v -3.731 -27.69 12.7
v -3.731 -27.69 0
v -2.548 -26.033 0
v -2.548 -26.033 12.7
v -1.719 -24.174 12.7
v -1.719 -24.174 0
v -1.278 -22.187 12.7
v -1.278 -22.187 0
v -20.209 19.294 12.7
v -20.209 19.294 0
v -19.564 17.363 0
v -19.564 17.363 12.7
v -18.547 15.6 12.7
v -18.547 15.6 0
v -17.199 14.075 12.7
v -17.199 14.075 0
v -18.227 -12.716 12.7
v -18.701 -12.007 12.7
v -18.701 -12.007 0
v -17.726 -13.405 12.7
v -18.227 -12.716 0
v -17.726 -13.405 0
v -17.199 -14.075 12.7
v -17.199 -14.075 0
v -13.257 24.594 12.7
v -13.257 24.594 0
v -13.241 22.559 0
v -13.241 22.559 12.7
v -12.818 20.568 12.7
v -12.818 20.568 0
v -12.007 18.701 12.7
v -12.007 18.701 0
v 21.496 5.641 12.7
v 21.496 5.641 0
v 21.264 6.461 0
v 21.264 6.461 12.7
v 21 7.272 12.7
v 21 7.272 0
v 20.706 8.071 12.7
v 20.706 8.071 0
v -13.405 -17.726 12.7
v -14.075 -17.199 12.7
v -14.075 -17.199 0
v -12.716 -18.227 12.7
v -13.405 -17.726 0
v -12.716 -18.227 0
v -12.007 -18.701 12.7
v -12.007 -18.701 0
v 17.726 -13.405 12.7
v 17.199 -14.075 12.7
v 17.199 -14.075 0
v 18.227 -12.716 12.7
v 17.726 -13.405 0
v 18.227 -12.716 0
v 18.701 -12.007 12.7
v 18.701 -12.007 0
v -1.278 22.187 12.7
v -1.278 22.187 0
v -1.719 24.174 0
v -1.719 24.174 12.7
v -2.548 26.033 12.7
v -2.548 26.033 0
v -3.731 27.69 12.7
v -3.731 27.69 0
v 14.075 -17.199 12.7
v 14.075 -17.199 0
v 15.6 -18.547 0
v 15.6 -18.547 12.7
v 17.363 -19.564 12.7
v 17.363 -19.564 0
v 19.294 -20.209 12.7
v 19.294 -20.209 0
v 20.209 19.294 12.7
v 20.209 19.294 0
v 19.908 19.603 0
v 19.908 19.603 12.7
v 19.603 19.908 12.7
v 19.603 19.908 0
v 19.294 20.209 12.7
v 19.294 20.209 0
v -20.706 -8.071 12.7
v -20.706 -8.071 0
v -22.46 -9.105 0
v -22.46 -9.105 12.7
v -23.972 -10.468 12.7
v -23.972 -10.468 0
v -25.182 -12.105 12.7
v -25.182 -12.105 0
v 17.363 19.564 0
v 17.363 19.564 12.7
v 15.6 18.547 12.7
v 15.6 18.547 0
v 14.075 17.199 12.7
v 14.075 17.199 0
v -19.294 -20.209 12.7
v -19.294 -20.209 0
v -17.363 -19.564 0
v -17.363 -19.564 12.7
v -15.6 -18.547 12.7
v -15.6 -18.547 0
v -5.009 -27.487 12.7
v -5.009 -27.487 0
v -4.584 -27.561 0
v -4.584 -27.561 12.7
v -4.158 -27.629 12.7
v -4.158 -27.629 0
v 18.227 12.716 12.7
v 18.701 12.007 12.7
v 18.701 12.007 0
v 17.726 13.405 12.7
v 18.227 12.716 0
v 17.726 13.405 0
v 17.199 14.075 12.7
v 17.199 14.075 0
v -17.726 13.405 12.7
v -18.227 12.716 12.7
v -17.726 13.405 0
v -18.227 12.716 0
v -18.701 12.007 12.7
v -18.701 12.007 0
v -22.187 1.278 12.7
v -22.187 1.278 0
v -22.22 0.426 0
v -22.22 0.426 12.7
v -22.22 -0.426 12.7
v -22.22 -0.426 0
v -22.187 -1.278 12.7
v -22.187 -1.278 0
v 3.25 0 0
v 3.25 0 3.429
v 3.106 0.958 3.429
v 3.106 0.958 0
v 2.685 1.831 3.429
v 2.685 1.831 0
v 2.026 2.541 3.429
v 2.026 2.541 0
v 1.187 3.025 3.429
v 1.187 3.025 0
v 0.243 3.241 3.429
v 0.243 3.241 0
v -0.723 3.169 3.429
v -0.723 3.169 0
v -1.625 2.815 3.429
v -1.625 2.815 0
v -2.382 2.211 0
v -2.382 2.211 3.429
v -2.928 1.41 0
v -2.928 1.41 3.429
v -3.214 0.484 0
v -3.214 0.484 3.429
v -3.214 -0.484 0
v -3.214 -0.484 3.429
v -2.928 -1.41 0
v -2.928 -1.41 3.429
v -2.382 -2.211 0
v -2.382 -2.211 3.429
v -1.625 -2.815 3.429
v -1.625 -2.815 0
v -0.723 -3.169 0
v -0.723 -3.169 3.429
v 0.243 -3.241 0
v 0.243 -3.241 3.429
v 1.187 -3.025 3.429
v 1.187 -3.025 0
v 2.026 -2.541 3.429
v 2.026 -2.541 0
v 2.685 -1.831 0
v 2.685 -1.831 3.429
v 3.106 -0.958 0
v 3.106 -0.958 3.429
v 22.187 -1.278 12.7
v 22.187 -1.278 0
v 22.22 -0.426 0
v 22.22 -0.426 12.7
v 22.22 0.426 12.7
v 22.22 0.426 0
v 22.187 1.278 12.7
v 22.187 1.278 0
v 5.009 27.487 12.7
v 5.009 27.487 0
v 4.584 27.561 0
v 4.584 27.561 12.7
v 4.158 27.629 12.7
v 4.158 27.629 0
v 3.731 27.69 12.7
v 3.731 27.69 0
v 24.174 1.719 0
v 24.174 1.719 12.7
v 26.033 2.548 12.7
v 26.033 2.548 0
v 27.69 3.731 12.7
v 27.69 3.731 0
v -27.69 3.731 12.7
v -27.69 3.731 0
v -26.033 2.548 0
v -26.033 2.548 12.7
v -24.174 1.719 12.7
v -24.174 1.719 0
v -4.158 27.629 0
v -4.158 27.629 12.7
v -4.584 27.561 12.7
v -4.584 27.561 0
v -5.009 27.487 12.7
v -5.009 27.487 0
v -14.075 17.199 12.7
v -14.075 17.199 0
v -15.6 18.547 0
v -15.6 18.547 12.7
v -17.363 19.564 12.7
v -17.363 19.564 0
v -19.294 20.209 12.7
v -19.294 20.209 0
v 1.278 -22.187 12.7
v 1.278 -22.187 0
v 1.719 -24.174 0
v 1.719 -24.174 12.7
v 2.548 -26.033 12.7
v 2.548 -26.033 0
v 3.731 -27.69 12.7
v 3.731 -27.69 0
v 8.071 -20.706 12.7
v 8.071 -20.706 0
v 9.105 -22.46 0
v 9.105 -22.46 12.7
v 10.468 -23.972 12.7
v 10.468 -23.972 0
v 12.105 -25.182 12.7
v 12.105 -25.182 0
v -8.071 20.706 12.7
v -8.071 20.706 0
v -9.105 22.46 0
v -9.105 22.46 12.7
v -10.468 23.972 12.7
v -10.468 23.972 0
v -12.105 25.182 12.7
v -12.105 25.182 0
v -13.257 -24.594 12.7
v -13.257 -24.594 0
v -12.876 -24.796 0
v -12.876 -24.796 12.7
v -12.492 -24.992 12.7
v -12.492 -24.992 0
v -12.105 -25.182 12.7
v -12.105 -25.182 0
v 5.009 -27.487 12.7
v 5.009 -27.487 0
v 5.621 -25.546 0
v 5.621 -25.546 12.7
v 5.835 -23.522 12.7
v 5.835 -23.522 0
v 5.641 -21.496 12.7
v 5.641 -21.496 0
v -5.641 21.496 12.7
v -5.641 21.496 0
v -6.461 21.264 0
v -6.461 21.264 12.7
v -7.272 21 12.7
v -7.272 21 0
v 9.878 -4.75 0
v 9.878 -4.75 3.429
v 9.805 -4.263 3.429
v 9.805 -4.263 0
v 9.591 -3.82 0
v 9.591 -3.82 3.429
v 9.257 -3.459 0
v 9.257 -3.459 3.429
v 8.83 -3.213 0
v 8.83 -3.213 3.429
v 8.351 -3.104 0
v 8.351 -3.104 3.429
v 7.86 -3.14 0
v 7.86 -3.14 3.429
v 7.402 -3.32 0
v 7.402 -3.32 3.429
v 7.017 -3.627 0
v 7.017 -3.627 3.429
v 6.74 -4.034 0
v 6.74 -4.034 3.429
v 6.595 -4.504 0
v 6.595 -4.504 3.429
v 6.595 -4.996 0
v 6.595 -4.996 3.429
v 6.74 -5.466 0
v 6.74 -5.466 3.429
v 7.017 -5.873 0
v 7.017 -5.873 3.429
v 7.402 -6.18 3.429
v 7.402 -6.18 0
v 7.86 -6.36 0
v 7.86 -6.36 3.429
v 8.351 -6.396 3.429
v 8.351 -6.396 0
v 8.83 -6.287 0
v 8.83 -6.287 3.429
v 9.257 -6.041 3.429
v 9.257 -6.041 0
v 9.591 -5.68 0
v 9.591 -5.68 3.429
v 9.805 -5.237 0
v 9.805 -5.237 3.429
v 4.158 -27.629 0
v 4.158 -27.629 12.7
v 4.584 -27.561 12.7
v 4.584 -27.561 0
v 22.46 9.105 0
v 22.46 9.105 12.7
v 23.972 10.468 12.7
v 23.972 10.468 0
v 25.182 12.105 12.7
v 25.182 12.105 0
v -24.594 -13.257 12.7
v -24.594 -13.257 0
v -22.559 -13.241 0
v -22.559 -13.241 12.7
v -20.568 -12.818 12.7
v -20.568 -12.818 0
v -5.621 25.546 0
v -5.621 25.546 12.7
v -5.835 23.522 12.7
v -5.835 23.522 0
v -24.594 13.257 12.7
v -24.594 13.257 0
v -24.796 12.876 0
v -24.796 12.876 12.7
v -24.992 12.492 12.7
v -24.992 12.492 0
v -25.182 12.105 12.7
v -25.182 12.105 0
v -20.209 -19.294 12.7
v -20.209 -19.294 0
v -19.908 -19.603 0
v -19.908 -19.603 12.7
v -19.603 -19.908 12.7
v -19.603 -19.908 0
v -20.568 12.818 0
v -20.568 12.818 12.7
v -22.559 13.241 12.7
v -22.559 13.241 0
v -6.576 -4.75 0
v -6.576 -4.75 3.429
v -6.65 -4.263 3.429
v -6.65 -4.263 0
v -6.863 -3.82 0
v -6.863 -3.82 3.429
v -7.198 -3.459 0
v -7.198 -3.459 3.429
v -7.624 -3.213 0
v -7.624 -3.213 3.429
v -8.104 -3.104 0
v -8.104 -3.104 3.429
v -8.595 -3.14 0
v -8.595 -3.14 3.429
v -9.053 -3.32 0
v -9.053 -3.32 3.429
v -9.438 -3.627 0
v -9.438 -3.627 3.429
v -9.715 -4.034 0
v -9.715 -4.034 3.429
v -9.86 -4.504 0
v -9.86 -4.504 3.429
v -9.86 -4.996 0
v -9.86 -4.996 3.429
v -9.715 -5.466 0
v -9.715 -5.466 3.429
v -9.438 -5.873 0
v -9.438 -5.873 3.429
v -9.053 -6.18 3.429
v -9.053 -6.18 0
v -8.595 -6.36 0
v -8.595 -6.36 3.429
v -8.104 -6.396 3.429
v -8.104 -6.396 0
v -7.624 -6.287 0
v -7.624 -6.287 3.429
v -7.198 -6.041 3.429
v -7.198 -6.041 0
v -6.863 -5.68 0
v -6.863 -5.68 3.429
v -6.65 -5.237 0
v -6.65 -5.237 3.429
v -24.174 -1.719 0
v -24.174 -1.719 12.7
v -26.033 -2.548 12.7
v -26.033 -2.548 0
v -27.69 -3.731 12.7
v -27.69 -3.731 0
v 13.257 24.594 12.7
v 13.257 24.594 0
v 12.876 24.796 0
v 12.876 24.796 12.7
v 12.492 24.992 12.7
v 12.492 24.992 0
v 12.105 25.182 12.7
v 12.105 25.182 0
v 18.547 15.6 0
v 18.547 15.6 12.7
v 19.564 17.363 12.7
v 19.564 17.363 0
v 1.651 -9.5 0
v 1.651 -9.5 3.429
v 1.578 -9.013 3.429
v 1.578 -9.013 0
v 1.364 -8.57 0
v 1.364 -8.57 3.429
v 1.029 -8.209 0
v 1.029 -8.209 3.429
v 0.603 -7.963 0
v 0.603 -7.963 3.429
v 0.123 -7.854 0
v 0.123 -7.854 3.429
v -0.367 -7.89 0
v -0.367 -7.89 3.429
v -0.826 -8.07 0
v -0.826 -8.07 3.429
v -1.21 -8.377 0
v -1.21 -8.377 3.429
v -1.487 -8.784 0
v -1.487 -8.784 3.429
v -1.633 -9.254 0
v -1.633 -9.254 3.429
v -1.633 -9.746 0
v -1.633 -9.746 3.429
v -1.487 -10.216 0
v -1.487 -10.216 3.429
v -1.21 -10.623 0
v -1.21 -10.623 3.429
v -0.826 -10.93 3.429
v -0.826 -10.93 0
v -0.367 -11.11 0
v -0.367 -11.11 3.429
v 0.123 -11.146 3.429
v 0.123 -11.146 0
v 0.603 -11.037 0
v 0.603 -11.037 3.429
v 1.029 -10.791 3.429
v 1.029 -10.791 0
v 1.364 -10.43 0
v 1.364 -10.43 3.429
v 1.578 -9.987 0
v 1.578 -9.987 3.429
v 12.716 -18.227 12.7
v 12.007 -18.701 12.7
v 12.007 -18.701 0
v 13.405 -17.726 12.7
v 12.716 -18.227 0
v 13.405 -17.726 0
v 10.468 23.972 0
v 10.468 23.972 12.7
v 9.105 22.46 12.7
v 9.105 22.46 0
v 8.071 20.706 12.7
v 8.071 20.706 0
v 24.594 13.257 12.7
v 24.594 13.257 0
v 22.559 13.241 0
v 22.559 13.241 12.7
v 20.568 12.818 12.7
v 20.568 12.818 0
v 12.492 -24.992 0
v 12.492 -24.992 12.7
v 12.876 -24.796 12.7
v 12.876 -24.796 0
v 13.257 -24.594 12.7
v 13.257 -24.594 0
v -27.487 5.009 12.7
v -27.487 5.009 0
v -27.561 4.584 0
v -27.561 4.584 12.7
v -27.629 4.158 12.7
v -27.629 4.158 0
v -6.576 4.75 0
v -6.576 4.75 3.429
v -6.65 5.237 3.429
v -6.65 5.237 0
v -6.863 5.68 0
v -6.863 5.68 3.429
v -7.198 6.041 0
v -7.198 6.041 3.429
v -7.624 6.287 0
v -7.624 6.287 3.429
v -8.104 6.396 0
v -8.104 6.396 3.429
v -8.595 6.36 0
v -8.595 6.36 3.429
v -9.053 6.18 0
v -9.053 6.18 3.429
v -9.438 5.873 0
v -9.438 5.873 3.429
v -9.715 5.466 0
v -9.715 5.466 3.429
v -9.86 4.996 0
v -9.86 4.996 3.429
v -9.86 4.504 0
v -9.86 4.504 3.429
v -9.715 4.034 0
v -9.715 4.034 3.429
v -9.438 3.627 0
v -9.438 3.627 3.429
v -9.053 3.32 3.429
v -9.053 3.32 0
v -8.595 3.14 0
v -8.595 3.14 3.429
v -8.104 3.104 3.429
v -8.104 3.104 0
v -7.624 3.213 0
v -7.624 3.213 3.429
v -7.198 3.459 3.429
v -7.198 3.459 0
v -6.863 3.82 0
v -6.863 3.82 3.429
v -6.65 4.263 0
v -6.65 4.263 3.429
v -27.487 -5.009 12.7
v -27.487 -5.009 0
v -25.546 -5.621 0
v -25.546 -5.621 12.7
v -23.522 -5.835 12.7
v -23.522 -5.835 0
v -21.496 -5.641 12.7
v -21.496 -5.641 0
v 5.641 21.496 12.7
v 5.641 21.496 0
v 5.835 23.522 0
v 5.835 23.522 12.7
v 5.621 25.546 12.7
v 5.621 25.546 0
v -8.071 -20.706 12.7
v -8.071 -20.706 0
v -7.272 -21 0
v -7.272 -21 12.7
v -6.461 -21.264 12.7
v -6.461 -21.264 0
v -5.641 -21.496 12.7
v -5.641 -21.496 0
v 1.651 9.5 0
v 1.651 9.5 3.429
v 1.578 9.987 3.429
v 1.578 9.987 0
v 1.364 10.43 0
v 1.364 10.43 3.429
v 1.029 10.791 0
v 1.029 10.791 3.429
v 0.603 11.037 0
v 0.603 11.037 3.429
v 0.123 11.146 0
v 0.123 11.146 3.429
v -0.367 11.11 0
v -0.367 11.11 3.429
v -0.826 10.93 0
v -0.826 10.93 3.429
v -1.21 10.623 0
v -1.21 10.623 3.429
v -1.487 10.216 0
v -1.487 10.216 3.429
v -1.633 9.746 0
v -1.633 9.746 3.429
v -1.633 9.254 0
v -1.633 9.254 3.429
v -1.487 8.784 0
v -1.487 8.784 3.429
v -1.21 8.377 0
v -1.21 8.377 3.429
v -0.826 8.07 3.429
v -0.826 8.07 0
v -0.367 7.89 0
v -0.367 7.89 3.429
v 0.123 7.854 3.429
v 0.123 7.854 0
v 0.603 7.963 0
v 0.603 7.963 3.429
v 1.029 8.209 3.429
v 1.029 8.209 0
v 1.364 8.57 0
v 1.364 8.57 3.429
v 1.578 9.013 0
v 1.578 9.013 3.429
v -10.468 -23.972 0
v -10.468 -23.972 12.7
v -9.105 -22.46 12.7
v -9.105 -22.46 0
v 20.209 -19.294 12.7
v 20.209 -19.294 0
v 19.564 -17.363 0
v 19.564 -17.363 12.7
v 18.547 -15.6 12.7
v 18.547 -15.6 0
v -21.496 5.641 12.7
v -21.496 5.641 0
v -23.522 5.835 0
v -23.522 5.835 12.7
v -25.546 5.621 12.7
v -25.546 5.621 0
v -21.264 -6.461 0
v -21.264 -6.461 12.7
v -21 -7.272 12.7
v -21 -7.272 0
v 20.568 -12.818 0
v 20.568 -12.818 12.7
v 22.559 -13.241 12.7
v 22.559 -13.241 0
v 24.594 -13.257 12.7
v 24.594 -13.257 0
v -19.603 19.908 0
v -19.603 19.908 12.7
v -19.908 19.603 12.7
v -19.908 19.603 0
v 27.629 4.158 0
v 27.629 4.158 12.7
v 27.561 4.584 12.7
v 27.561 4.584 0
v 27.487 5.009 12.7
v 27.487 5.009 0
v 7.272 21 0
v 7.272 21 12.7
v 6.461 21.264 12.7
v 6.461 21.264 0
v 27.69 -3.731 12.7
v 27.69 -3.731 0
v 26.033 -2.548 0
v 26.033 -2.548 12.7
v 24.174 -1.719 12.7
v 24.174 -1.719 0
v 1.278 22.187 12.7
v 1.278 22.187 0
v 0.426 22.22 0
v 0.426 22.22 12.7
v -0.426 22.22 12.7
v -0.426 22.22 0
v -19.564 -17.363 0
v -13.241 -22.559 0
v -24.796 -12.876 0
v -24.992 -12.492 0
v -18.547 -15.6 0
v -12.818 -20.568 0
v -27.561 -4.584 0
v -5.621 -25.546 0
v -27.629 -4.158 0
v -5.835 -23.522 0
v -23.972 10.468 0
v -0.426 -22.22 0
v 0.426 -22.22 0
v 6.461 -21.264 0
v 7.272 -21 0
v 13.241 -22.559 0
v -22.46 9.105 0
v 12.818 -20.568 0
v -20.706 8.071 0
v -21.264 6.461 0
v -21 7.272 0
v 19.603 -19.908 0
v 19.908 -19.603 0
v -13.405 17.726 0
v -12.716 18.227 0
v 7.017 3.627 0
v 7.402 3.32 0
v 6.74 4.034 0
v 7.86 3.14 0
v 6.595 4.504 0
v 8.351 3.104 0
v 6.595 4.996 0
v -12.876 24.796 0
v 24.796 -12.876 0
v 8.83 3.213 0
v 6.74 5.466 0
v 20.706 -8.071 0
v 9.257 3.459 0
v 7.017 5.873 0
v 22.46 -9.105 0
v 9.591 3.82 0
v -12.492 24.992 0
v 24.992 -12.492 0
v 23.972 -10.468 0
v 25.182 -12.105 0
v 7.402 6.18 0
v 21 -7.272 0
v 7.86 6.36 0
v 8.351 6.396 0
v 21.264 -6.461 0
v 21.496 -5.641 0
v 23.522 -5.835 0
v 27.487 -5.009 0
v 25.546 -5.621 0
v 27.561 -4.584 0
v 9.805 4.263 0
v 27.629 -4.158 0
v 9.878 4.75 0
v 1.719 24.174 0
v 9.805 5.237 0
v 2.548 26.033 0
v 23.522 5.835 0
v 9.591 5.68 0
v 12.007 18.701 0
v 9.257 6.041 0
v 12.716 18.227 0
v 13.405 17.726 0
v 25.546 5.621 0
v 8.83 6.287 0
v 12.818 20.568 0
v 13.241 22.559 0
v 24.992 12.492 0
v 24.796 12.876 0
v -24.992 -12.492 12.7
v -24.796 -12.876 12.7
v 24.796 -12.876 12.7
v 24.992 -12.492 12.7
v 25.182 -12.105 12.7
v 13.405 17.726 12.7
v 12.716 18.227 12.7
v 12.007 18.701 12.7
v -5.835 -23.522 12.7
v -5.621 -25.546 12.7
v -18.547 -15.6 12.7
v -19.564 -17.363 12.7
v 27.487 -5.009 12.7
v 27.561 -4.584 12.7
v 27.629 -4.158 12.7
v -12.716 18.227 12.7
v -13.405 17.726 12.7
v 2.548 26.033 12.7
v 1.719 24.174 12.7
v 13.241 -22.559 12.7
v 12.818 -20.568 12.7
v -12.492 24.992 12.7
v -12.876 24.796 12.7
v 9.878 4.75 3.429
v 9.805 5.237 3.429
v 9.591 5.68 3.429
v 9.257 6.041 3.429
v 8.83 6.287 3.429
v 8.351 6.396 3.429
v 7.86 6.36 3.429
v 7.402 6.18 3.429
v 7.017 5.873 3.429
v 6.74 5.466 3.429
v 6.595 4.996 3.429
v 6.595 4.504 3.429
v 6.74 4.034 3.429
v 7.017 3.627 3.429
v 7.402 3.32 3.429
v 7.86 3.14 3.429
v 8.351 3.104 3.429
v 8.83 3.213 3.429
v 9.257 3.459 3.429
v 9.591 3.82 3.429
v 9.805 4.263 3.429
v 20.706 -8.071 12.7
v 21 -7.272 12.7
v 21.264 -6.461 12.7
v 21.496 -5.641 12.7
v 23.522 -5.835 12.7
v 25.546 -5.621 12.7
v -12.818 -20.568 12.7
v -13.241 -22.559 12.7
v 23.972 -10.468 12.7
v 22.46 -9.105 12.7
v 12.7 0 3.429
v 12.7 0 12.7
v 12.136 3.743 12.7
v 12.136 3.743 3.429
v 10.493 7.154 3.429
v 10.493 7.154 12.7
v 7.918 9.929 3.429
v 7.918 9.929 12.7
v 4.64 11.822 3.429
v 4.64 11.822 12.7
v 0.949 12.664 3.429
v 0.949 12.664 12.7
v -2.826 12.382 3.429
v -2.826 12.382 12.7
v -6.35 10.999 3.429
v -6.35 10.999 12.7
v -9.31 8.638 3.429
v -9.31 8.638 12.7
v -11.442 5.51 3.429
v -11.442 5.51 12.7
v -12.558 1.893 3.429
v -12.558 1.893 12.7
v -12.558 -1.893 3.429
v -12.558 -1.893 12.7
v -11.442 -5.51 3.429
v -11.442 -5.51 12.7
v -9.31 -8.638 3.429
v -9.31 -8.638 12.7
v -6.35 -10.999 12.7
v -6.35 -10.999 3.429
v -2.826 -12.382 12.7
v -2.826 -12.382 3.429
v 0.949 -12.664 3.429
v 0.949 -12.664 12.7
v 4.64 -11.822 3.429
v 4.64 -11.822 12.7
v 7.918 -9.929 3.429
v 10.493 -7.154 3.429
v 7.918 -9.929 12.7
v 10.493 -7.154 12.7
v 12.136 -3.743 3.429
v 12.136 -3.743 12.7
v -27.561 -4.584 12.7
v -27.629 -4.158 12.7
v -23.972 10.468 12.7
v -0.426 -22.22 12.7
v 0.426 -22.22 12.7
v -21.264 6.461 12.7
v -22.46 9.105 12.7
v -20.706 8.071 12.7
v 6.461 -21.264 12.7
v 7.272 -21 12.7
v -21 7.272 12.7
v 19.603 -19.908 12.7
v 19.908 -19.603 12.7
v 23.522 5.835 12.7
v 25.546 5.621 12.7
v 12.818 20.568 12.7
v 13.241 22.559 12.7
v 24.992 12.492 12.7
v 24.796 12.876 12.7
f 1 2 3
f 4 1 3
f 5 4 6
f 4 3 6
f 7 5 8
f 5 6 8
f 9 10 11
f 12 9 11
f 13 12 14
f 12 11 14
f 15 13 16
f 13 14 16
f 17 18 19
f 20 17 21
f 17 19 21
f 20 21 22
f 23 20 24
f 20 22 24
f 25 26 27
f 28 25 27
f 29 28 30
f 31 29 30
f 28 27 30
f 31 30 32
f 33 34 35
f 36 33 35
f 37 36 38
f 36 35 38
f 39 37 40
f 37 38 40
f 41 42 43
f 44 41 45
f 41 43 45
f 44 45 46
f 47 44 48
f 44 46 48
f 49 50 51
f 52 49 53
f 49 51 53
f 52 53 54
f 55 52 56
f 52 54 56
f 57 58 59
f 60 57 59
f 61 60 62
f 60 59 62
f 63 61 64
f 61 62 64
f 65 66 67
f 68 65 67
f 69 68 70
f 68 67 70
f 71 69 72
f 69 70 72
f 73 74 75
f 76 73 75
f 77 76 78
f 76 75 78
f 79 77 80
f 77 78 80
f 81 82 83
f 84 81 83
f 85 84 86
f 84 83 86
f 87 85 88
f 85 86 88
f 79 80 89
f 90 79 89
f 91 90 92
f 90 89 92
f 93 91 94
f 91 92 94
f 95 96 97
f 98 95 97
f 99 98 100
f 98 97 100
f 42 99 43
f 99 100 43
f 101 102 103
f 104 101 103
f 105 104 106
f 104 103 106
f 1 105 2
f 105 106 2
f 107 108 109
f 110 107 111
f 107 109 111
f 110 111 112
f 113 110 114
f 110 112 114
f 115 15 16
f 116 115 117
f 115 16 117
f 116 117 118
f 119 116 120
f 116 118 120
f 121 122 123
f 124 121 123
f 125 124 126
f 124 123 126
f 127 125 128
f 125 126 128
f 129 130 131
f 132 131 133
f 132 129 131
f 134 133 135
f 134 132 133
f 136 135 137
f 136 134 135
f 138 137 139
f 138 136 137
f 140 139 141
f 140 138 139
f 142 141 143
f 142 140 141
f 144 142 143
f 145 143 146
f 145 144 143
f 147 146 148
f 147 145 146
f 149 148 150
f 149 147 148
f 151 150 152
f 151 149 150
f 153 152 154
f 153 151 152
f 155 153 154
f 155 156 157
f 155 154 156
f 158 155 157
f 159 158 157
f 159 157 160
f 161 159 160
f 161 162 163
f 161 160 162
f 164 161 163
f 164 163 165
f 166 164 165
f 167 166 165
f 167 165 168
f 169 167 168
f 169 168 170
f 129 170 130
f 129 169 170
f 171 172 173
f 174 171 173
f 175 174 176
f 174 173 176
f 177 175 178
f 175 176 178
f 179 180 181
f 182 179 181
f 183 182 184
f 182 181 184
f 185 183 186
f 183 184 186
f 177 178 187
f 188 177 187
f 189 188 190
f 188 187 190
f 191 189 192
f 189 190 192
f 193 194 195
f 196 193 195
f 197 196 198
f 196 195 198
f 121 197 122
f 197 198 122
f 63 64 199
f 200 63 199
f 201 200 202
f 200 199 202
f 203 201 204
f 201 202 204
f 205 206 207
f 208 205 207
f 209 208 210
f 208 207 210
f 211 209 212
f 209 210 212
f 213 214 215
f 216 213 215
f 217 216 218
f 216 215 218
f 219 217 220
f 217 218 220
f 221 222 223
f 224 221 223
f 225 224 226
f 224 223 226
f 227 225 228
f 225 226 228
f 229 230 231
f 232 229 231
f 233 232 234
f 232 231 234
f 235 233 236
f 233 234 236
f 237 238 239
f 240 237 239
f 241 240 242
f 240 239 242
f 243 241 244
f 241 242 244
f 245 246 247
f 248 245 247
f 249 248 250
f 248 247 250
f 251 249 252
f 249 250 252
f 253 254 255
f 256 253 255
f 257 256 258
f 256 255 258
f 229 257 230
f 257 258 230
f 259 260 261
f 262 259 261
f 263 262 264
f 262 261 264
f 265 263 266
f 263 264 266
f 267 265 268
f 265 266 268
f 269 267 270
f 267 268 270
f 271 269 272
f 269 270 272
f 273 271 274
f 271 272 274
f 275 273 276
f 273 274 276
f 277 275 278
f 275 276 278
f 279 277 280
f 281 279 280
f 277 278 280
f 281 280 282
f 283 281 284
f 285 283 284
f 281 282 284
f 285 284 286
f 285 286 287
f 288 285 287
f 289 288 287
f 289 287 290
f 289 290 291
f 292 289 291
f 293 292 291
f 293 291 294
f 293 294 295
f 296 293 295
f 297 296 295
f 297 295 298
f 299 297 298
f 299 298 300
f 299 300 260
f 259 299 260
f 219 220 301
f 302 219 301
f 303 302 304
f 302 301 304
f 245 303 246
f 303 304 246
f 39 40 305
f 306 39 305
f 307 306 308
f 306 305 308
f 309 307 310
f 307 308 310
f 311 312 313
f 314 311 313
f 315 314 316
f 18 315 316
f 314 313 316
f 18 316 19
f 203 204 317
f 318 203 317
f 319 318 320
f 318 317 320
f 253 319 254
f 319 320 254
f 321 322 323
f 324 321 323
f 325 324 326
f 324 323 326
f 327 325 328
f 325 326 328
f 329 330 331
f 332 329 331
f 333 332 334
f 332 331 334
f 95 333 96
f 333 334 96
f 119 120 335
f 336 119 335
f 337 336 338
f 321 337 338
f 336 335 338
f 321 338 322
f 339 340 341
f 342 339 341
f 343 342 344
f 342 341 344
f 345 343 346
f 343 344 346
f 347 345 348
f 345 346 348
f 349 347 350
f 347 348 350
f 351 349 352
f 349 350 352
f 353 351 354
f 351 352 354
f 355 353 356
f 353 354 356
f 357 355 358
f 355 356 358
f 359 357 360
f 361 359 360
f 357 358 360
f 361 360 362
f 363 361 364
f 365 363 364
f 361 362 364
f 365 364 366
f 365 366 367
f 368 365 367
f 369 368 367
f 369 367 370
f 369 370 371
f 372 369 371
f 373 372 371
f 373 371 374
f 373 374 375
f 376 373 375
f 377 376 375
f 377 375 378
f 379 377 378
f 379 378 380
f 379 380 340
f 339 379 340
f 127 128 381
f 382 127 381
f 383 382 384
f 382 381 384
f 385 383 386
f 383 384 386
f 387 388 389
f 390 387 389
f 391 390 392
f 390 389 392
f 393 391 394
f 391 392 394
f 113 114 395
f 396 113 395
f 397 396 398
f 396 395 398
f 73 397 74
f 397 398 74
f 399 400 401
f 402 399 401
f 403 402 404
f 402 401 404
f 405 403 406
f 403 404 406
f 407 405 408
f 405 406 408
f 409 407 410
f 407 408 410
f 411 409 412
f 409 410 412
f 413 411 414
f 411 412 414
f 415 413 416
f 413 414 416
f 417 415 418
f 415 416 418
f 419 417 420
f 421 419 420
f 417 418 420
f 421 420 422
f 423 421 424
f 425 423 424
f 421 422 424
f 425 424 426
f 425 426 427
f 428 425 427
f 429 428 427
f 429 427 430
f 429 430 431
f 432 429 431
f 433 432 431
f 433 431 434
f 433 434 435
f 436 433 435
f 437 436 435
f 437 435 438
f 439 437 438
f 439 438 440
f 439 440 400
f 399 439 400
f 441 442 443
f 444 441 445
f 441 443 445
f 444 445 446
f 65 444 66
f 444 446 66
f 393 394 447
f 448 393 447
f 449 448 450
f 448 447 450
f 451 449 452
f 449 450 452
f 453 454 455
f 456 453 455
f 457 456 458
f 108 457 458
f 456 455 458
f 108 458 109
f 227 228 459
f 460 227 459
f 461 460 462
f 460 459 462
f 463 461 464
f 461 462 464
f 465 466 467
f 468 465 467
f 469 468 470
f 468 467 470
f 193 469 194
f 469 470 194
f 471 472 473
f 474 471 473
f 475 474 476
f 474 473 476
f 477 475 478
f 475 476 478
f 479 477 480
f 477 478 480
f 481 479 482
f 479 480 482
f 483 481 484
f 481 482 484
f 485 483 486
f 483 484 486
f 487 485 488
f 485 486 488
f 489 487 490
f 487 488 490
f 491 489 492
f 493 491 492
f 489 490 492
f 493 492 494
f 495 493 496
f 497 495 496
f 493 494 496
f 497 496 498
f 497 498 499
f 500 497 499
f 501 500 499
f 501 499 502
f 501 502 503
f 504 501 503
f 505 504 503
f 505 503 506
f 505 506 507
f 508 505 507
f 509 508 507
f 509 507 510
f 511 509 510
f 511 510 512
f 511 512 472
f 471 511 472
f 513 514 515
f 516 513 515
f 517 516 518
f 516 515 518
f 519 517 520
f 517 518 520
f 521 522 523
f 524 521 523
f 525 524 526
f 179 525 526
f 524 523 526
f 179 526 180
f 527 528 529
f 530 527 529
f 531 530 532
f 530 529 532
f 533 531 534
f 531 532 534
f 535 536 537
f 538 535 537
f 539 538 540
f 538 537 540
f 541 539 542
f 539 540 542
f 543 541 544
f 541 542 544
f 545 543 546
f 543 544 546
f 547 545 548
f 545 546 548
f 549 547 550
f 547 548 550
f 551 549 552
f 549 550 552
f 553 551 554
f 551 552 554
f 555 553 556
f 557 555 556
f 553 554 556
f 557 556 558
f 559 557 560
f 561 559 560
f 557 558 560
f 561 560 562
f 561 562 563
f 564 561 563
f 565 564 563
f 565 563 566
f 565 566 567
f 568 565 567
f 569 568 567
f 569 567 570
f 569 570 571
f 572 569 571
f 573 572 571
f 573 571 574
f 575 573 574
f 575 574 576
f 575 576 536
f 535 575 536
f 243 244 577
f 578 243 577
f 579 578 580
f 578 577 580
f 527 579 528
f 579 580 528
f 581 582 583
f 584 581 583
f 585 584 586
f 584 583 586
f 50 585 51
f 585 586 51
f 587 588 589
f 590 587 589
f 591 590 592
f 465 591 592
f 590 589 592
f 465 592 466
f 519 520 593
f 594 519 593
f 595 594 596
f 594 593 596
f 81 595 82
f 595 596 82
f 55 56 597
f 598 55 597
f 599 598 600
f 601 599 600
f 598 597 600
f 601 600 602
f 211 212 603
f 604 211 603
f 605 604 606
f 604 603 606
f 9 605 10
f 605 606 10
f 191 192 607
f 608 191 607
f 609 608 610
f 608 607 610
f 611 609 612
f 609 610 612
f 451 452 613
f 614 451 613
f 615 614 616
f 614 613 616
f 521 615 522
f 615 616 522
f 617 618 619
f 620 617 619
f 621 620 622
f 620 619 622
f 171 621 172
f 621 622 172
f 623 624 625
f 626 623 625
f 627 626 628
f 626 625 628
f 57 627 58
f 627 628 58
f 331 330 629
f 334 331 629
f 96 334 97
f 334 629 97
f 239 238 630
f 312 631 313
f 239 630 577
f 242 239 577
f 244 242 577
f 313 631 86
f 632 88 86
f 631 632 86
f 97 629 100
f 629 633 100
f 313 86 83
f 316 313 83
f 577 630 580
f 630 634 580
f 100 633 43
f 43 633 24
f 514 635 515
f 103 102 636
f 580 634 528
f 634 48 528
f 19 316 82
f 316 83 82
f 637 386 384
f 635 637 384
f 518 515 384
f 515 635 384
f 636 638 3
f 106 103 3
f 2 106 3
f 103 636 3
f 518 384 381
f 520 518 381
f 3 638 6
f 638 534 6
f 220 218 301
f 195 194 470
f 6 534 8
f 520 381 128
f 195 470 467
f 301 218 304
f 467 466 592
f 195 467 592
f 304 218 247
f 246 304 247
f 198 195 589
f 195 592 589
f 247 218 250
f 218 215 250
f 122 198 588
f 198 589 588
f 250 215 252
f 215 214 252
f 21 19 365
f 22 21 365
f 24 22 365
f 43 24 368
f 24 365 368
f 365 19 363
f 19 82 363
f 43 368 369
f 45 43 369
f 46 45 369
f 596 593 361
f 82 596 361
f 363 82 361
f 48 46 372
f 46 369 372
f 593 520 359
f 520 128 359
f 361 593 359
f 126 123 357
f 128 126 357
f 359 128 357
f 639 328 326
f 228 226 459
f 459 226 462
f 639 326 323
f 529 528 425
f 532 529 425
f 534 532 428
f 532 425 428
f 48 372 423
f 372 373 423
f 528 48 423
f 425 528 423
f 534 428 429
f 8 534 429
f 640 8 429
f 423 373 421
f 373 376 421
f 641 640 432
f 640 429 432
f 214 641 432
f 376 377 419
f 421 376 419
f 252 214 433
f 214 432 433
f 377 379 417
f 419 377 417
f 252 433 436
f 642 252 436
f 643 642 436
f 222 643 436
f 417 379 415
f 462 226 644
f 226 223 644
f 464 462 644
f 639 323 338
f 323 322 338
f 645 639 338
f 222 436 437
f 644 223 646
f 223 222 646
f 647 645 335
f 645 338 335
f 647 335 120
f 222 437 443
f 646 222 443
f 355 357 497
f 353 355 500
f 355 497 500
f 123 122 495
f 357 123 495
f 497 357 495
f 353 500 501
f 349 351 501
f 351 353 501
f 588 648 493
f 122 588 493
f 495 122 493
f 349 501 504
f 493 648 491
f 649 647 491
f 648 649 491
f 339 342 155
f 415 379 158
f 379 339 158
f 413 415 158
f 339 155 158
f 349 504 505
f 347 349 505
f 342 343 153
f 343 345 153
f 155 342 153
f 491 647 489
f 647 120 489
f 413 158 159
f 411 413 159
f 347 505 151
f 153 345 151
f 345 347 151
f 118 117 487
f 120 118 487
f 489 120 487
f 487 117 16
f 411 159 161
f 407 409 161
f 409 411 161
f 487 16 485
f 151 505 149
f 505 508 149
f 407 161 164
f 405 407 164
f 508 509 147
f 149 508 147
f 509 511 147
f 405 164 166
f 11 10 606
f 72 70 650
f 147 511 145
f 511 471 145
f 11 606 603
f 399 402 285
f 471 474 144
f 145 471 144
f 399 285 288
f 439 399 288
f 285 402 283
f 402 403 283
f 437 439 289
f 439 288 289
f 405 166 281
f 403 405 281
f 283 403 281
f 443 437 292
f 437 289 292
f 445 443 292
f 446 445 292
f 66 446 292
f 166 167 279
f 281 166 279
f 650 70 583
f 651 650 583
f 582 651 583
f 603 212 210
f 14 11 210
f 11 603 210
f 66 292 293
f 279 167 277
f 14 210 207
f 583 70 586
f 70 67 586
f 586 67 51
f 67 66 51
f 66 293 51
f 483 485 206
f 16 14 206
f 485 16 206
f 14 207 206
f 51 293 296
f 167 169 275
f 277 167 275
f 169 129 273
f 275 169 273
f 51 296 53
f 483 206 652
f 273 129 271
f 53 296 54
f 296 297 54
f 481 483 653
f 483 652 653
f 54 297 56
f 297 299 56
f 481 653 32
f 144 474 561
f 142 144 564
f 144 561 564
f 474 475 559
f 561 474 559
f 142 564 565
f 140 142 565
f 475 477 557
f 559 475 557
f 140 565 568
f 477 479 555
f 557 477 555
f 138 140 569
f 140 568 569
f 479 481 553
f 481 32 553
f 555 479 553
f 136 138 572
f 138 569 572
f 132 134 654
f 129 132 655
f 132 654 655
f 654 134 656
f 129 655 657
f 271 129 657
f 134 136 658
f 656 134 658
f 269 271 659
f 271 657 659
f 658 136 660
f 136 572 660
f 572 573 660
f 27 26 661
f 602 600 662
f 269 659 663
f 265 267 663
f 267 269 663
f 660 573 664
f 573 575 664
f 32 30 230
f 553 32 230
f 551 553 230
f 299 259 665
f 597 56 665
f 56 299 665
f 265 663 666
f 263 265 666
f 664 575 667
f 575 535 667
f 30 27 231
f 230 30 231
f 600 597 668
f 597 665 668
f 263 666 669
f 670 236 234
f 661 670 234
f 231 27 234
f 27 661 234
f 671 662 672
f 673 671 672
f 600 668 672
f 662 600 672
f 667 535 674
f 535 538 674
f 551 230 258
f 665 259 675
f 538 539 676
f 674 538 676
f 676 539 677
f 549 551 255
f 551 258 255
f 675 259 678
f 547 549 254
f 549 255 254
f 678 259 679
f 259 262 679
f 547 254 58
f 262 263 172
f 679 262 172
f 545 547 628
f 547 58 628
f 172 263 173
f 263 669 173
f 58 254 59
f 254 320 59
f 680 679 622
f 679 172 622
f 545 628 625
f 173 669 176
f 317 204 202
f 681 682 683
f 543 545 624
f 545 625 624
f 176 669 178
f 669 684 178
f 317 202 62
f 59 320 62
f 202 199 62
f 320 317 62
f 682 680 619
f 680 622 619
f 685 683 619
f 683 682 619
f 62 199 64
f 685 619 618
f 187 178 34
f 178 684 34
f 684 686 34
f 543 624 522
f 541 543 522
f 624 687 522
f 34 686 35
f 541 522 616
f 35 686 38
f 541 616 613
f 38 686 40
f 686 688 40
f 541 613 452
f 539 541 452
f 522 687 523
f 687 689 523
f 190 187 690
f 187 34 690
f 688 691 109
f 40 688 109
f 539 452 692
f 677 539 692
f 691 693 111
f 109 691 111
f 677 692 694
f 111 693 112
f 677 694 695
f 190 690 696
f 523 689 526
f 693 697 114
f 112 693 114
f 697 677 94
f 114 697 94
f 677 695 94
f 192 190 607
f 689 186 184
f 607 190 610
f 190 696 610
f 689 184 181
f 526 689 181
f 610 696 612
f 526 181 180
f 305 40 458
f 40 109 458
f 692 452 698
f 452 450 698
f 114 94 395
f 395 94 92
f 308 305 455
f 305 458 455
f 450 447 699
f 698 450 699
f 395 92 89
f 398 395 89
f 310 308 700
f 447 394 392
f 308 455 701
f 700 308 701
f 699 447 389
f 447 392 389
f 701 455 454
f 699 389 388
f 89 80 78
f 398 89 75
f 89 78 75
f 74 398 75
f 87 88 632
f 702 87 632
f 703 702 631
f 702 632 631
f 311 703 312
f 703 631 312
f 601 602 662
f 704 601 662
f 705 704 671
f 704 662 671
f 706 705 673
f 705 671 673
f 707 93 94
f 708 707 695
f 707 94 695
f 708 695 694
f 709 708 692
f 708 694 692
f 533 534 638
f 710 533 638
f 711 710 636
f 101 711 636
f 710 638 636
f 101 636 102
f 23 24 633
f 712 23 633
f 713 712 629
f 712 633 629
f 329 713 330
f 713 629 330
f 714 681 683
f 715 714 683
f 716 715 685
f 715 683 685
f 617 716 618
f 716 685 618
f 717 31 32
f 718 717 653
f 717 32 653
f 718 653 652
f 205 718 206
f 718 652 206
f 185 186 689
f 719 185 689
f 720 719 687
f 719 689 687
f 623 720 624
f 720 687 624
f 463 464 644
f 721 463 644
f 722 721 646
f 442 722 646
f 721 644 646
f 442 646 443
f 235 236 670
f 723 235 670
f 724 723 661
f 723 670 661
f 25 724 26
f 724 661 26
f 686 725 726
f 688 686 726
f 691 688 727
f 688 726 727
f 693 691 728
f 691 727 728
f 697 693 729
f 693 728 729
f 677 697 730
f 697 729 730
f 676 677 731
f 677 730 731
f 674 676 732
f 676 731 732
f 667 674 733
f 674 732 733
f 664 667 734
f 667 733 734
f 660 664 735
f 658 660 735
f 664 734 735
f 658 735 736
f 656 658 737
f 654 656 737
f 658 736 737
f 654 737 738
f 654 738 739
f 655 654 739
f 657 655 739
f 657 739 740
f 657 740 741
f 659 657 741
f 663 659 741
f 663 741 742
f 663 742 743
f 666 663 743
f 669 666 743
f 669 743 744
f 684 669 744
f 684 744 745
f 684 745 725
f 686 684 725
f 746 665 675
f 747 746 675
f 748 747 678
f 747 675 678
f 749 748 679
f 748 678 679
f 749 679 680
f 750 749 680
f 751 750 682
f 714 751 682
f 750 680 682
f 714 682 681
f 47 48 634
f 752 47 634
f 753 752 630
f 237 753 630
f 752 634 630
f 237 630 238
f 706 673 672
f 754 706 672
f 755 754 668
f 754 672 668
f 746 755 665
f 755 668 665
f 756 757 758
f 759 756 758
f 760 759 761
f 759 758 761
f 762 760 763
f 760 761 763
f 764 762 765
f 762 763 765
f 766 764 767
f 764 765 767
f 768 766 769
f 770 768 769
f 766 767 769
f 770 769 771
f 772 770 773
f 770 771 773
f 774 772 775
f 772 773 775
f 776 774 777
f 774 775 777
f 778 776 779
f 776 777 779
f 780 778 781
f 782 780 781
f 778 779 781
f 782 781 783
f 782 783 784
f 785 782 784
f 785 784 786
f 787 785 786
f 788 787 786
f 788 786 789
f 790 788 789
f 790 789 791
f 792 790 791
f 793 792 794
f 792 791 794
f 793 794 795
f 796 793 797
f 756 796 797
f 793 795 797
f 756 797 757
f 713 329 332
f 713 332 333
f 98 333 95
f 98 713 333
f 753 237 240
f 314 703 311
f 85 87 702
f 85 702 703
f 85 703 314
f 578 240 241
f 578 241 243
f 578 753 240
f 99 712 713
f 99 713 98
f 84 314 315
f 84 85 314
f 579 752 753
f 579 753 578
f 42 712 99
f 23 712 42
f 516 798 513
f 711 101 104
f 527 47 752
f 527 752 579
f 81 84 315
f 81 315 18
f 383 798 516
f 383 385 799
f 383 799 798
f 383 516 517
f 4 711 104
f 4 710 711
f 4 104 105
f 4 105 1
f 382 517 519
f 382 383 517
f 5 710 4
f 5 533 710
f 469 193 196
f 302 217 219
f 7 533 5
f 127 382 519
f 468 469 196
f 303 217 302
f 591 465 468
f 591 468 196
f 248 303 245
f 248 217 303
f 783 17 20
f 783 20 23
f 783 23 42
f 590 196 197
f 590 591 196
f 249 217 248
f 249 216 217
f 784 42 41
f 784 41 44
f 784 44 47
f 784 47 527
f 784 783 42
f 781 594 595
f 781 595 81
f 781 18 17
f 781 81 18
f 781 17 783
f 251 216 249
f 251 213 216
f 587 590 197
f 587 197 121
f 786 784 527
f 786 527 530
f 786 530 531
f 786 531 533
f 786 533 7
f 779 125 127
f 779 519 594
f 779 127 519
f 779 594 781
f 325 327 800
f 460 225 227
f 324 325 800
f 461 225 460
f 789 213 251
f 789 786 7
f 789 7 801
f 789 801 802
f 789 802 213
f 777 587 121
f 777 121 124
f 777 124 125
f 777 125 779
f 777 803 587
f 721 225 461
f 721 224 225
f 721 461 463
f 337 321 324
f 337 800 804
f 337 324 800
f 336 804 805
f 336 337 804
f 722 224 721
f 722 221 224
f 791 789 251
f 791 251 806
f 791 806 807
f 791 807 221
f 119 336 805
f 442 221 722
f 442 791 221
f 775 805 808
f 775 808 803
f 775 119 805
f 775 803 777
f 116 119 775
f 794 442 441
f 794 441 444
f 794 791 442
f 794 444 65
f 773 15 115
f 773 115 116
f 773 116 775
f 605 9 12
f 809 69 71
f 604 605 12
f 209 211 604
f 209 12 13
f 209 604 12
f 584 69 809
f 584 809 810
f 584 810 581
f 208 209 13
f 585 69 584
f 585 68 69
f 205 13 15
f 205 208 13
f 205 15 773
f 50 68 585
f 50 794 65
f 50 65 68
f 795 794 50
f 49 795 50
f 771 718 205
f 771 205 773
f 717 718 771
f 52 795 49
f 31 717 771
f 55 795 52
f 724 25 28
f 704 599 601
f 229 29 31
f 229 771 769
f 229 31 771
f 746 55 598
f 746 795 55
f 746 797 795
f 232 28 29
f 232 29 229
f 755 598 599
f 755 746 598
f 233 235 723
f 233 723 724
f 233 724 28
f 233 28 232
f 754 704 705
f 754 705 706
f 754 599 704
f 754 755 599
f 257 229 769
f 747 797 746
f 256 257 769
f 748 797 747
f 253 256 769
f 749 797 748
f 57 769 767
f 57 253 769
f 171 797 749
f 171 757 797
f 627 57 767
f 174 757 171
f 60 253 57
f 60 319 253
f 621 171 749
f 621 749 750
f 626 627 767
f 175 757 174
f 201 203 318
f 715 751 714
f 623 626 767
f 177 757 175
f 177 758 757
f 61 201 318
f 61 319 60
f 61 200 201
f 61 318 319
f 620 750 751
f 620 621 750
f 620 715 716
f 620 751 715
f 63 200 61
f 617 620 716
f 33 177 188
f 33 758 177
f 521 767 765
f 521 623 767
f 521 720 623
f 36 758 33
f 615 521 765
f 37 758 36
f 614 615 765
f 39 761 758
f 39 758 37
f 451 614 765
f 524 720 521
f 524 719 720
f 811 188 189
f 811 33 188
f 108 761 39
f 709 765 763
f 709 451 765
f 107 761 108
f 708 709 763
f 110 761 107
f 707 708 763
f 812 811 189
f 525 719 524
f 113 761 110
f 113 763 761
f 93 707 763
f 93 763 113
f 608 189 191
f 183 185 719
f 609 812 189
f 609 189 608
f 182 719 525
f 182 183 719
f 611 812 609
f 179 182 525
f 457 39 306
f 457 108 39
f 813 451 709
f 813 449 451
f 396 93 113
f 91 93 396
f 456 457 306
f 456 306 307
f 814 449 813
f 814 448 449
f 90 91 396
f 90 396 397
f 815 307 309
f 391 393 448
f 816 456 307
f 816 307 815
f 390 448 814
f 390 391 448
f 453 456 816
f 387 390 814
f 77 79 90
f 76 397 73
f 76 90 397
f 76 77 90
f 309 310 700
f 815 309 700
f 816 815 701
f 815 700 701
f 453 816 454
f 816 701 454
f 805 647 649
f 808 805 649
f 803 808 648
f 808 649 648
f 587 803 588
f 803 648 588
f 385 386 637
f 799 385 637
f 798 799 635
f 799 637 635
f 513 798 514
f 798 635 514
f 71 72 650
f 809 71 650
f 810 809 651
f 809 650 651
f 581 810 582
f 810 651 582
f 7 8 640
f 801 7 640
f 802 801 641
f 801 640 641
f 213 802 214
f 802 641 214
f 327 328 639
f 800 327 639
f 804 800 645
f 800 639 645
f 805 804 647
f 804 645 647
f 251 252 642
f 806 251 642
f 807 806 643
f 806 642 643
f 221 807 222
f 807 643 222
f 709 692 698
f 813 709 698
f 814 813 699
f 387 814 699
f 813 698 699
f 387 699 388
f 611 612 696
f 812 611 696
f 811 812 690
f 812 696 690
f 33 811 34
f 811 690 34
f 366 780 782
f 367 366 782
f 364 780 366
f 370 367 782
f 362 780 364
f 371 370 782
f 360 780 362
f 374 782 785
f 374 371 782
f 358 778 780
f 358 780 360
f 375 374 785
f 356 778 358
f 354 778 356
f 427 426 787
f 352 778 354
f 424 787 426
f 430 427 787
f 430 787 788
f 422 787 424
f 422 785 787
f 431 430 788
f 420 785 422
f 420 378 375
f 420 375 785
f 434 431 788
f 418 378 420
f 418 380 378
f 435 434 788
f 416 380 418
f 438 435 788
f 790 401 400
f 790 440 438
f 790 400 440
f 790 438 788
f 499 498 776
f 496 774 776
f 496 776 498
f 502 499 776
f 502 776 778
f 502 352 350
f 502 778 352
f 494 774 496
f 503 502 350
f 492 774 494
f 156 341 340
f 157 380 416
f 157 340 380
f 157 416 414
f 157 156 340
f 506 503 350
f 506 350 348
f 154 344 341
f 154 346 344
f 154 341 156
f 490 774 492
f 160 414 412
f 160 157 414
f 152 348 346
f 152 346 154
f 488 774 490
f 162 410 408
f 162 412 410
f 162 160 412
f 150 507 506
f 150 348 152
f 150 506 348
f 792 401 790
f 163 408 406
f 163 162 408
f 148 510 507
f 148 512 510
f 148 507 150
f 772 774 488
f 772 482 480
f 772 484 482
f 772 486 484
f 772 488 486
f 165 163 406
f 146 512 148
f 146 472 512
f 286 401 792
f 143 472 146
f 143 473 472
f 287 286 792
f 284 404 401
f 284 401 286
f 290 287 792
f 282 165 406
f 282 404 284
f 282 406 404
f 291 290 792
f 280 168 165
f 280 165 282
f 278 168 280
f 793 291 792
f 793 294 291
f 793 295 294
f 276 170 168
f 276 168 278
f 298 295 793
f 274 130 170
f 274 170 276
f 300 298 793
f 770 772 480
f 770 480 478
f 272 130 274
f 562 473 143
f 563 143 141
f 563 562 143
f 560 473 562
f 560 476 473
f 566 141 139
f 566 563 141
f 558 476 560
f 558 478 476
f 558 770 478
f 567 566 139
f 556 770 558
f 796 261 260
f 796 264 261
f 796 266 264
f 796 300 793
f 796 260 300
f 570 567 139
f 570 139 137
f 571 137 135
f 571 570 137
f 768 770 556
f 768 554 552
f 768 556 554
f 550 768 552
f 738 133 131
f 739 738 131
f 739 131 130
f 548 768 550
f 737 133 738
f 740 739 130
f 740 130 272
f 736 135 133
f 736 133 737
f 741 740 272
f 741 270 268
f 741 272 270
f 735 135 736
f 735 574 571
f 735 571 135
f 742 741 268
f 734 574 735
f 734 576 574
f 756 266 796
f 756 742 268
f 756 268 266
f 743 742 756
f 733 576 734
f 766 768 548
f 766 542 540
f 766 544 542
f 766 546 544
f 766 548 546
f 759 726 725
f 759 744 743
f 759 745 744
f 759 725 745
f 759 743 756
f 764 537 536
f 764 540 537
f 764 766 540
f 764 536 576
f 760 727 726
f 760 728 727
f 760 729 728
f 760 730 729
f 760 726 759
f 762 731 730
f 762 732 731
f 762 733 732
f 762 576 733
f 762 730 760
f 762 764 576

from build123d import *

# Parameters (mm, degrees)
SKETCH1_R           = 3.25
BOSS_EXTRUDE1_DEPTH = 12.7
CUT_EXTRUDE1_REACH  = 43.167
SKETCH2_R           = 1.651
SKETCH3_R           = 12.7
CUT_EXTRUDE2_DEPTH  = 9.271


with BuildPart() as part:
    # Sketch1 → Boss-Extrude1 (new body)
    with BuildSketch(Plane.XY):
        with BuildLine():
            ThreePointArc((-27.689807384, 3.730705969), (-25.124393342, 2.086949602), (-22.186968024, 1.277742146))
            ThreePointArc((-22.186968024, 1.277742146), (-22.22373, 0), (-22.186968024, -1.277742146))
            ThreePointArc((-22.186968024, -1.277742146), (-25.124393342, -2.086949602), (-27.689807384, -3.730705969))
            ThreePointArc((-27.689807384, -3.730705969), (-27.596012236, -4.370778953), (-27.487423293, -5.00850883))
            ThreePointArc((-27.487423293, -5.00850883), (-24.539620899, -5.779057498), (-21.495904554, -5.640945179))
            ThreePointArc((-21.495904554, -5.640945179), (-21.136023233, -6.867510248), (-20.706216479, -8.071355168))
            ThreePointArc((-20.706216479, -8.071355168), (-23.249815112, -9.748671534), (-25.181720202, -12.104733275))
            ThreePointArc((-25.181720202, -12.104733275), (-24.894722286, -12.684494563), (-24.594378694, -13.257455889))
            ThreePointArc((-24.594378694, -13.257455889), (-21.552739385, -13.079370185), (-18.700672175, -12.007457487))
            ThreePointArc((-18.700672175, -12.007457487), (-17.979375248, -13.062780745), (-17.198596196, -14.074887709))
            ThreePointArc((-17.198596196, -14.074887709), (-19.099382988, -16.456125574), (-20.208670796, -19.293864949))
            ThreePointArc((-20.208670796, -19.293864949), (-19.756563466, -19.756563466), (-19.293864949, -20.208670796))
            ThreePointArc((-19.293864949, -20.208670796), (-16.456125574, -19.099382988), (-14.074887709, -17.198596196))
            ThreePointArc((-14.074887709, -17.198596196), (-13.062780745, -17.979375248), (-12.007457487, -18.700672175))
            ThreePointArc((-12.007457487, -18.700672175), (-13.079370185, -21.552739385), (-13.257455889, -24.594378694))
            ThreePointArc((-13.257455889, -24.594378694), (-12.684494563, -24.894722286), (-12.104733275, -25.181720202))
            ThreePointArc((-12.104733275, -25.181720202), (-9.748671534, -23.249815112), (-8.071355168, -20.706216479))
            ThreePointArc((-8.071355168, -20.706216479), (-6.867510248, -21.136023233), (-5.640945179, -21.495904554))
            ThreePointArc((-5.640945179, -21.495904554), (-5.779057498, -24.539620899), (-5.00850883, -27.487423293))
            ThreePointArc((-5.00850883, -27.487423293), (-4.370778953, -27.596012236), (-3.730705969, -27.689807384))
            ThreePointArc((-3.730705969, -27.689807384), (-2.086949602, -25.124393342), (-1.277742146, -22.186968024))
            ThreePointArc((-1.277742146, -22.186968024), (0, -22.22373), (1.277742146, -22.186968024))
            ThreePointArc((1.277742146, -22.186968024), (2.086949602, -25.124393342), (3.730705969, -27.689807384))
            ThreePointArc((3.730705969, -27.689807384), (4.370778953, -27.596012236), (5.00850883, -27.487423293))
            ThreePointArc((5.00850883, -27.487423293), (5.779057498, -24.539620899), (5.640945179, -21.495904554))
            ThreePointArc((5.640945179, -21.495904554), (6.867510248, -21.136023233), (8.071355168, -20.706216479))
            ThreePointArc((8.071355168, -20.706216479), (9.748671534, -23.249815112), (12.104733275, -25.181720202))
            ThreePointArc((12.104733275, -25.181720202), (12.684494563, -24.894722286), (13.257455889, -24.594378694))
            ThreePointArc((13.257455889, -24.594378694), (13.079370185, -21.552739385), (12.007457487, -18.700672175))
            ThreePointArc((12.007457487, -18.700672175), (13.062780745, -17.979375248), (14.074887709, -17.198596196))
            ThreePointArc((14.074887709, -17.198596196), (16.456125574, -19.099382988), (19.293864949, -20.208670796))
            ThreePointArc((19.293864949, -20.208670796), (19.756563466, -19.756563466), (20.208670796, -19.293864949))
            ThreePointArc((20.208670796, -19.293864949), (19.099382988, -16.456125574), (17.198596196, -14.074887709))
            ThreePointArc((17.198596196, -14.074887709), (17.979375248, -13.062780745), (18.700672175, -12.007457487))
            ThreePointArc((18.700672175, -12.007457487), (21.552739385, -13.079370185), (24.594378694, -13.257455889))
            ThreePointArc((24.594378694, -13.257455889), (24.894722286, -12.684494563), (25.181720202, -12.104733275))
            ThreePointArc((25.181720202, -12.104733275), (23.249815112, -9.748671534), (20.706216479, -8.071355168))
            ThreePointArc((20.706216479, -8.071355168), (21.136023233, -6.867510248), (21.495904554, -5.640945179))
            ThreePointArc((21.495904554, -5.640945179), (24.539620899, -5.779057498), (27.487423293, -5.00850883))
            ThreePointArc((27.487423293, -5.00850883), (27.596012236, -4.370778953), (27.689807384, -3.730705969))
            ThreePointArc((27.689807384, -3.730705969), (25.124393342, -2.086949602), (22.186968024, -1.277742146))
            ThreePointArc((22.186968024, -1.277742146), (22.22373, 0), (22.186968024, 1.277742146))
            ThreePointArc((22.186968024, 1.277742146), (25.124393342, 2.086949602), (27.689807384, 3.730705969))
            ThreePointArc((27.689807384, 3.730705969), (27.596012236, 4.370778953), (27.487423293, 5.00850883))
            ThreePointArc((27.487423293, 5.00850883), (24.539620899, 5.779057498), (21.495904554, 5.640945179))
            ThreePointArc((21.495904554, 5.640945179), (21.136023233, 6.867510248), (20.706216479, 8.071355168))
            ThreePointArc((20.706216479, 8.071355168), (23.249815112, 9.748671534), (25.181720202, 12.104733275))
            ThreePointArc((25.181720202, 12.104733275), (24.894722286, 12.684494563), (24.594378694, 13.257455889))
            ThreePointArc((24.594378694, 13.257455889), (21.552739385, 13.079370185), (18.700672175, 12.007457487))
            ThreePointArc((18.700672175, 12.007457487), (17.979375248, 13.062780745), (17.198596196, 14.074887709))
            ThreePointArc((17.198596196, 14.074887709), (19.099382988, 16.456125574), (20.208670796, 19.293864949))
            ThreePointArc((20.208670796, 19.293864949), (19.756563466, 19.756563466), (19.293864949, 20.208670796))
            ThreePointArc((19.293864949, 20.208670796), (16.456125574, 19.099382988), (14.074887709, 17.198596196))
            ThreePointArc((14.074887709, 17.198596196), (13.062780745, 17.979375248), (12.007457487, 18.700672175))
            ThreePointArc((12.007457487, 18.700672175), (13.079370185, 21.552739385), (13.257455889, 24.594378694))
            ThreePointArc((13.257455889, 24.594378694), (12.684494563, 24.894722286), (12.104733275, 25.181720202))
            ThreePointArc((12.104733275, 25.181720202), (9.748671534, 23.249815112), (8.071355168, 20.706216479))
            ThreePointArc((8.071355168, 20.706216479), (6.867510248, 21.136023233), (5.640945179, 21.495904554))
            ThreePointArc((5.640945179, 21.495904554), (5.779057498, 24.539620899), (5.00850883, 27.487423293))
            ThreePointArc((5.00850883, 27.487423293), (4.370778953, 27.596012236), (3.730705969, 27.689807384))
            ThreePointArc((3.730705969, 27.689807384), (2.086949602, 25.124393342), (1.277742146, 22.186968024))
            ThreePointArc((1.277742146, 22.186968024), (0, 22.22373), (-1.277742146, 22.186968024))
            ThreePointArc((-1.277742146, 22.186968024), (-2.086949602, 25.124393342), (-3.730705969, 27.689807384))
            ThreePointArc((-3.730705969, 27.689807384), (-4.370778953, 27.596012236), (-5.00850883, 27.487423293))
            ThreePointArc((-5.00850883, 27.487423293), (-5.779057498, 24.539620899), (-5.640945179, 21.495904554))
            ThreePointArc((-5.640945179, 21.495904554), (-6.867510248, 21.136023233), (-8.071355168, 20.706216479))
            ThreePointArc((-8.071355168, 20.706216479), (-9.748671534, 23.249815112), (-12.104733275, 25.181720202))
            ThreePointArc((-12.104733275, 25.181720202), (-12.684494563, 24.894722286), (-13.257455889, 24.594378694))
            ThreePointArc((-13.257455889, 24.594378694), (-13.079370185, 21.552739385), (-12.007457487, 18.700672175))
            ThreePointArc((-12.007457487, 18.700672175), (-13.062780745, 17.979375248), (-14.074887709, 17.198596196))
            ThreePointArc((-14.074887709, 17.198596196), (-16.456125574, 19.099382988), (-19.293864949, 20.208670796))
            ThreePointArc((-19.293864949, 20.208670796), (-19.756563466, 19.756563466), (-20.208670796, 19.293864949))
            ThreePointArc((-20.208670796, 19.293864949), (-19.099382988, 16.456125574), (-17.198596196, 14.074887709))
            ThreePointArc((-17.198596196, 14.074887709), (-17.979375248, 13.062780745), (-18.700672175, 12.007457487))
            ThreePointArc((-18.700672175, 12.007457487), (-21.552739385, 13.079370185), (-24.594378694, 13.257455889))
            ThreePointArc((-24.594378694, 13.257455889), (-24.894722286, 12.684494563), (-25.181720202, 12.104733275))
            ThreePointArc((-25.181720202, 12.104733275), (-23.249815112, 9.748671534), (-20.706216479, 8.071355168))
            ThreePointArc((-20.706216479, 8.071355168), (-21.136023233, 6.867510248), (-21.495904554, 5.640945179))
            ThreePointArc((-21.495904554, 5.640945179), (-24.539620899, 5.779057498), (-27.487423293, 5.00850883))
            ThreePointArc((-27.487423293, 5.00850883), (-27.596012236, 4.370778953), (-27.689807384, 3.730705969))
        make_face()
        Circle(SKETCH1_R, mode=Mode.SUBTRACT)
    extrude(amount=BOSS_EXTRUDE1_DEPTH)

    # Sketch2 → Cut-Extrude1 (cut, up to next)
    with BuildSketch(Plane.XY.offset(12.7), mode=Mode.PRIVATE) as cut_extrude1_sk1:
        with Locations((0, 9.5)):
            Circle(SKETCH2_R)
    cut_extrude1_tool1 = extrude(cut_extrude1_sk1.sketch, amount=-CUT_EXTRUDE1_REACH, mode=Mode.PRIVATE) & part.part
    # Sketch2 → Cut-Extrude1 (cut, up to next)
    with BuildSketch(Plane.XY.offset(12.7), mode=Mode.PRIVATE) as cut_extrude1_sk2:
        with Locations((8.227241336, 4.75)):
            Circle(SKETCH2_R)
    cut_extrude1_tool2 = extrude(cut_extrude1_sk2.sketch, amount=-CUT_EXTRUDE1_REACH, mode=Mode.PRIVATE) & part.part
    # Sketch2 → Cut-Extrude1 (cut, up to next)
    with BuildSketch(Plane.XY.offset(12.7), mode=Mode.PRIVATE) as cut_extrude1_sk3:
        with Locations((8.227241336, -4.75)):
            Circle(SKETCH2_R)
    cut_extrude1_tool3 = extrude(cut_extrude1_sk3.sketch, amount=-CUT_EXTRUDE1_REACH, mode=Mode.PRIVATE) & part.part
    # Sketch2 → Cut-Extrude1 (cut, up to next)
    with BuildSketch(Plane.XY.offset(12.7), mode=Mode.PRIVATE) as cut_extrude1_sk4:
        with Locations((0, -9.5)):
            Circle(SKETCH2_R)
    cut_extrude1_tool4 = extrude(cut_extrude1_sk4.sketch, amount=-CUT_EXTRUDE1_REACH, mode=Mode.PRIVATE) & part.part
    # Sketch2 → Cut-Extrude1 (cut, up to next)
    with BuildSketch(Plane.XY.offset(12.7), mode=Mode.PRIVATE) as cut_extrude1_sk5:
        with Locations((-8.227241336, -4.75)):
            Circle(SKETCH2_R)
    cut_extrude1_tool5 = extrude(cut_extrude1_sk5.sketch, amount=-CUT_EXTRUDE1_REACH, mode=Mode.PRIVATE) & part.part
    # Sketch2 → Cut-Extrude1 (cut, up to next)
    with BuildSketch(Plane.XY.offset(12.7), mode=Mode.PRIVATE) as cut_extrude1_sk6:
        with Locations((-8.227241336, 4.75)):
            Circle(SKETCH2_R)
    cut_extrude1_tool6 = extrude(cut_extrude1_sk6.sketch, amount=-CUT_EXTRUDE1_REACH, mode=Mode.PRIVATE) & part.part
    add(cut_extrude1_tool1.solids().sort_by_distance((0, 9.5, 12.7))[0], mode=Mode.SUBTRACT)
    add(cut_extrude1_tool2.solids().sort_by_distance((8.227241, 4.75, 12.7))[0], mode=Mode.SUBTRACT)
    add(cut_extrude1_tool3.solids().sort_by_distance((8.227241, -4.75, 12.7))[0], mode=Mode.SUBTRACT)
    add(cut_extrude1_tool4.solids().sort_by_distance((0, -9.5, 12.7))[0], mode=Mode.SUBTRACT)
    add(cut_extrude1_tool5.solids().sort_by_distance((-8.227241, -4.75, 12.7))[0], mode=Mode.SUBTRACT)
    add(cut_extrude1_tool6.solids().sort_by_distance((-8.227241, 4.75, 12.7))[0], mode=Mode.SUBTRACT)

    # Sketch3 → Cut-Extrude2 (cut)
    with BuildSketch(Plane.XY.offset(12.7)):
        Circle(SKETCH3_R)
    extrude(amount=-CUT_EXTRUDE2_DEPTH, mode=Mode.SUBTRACT)


solid = part.part
